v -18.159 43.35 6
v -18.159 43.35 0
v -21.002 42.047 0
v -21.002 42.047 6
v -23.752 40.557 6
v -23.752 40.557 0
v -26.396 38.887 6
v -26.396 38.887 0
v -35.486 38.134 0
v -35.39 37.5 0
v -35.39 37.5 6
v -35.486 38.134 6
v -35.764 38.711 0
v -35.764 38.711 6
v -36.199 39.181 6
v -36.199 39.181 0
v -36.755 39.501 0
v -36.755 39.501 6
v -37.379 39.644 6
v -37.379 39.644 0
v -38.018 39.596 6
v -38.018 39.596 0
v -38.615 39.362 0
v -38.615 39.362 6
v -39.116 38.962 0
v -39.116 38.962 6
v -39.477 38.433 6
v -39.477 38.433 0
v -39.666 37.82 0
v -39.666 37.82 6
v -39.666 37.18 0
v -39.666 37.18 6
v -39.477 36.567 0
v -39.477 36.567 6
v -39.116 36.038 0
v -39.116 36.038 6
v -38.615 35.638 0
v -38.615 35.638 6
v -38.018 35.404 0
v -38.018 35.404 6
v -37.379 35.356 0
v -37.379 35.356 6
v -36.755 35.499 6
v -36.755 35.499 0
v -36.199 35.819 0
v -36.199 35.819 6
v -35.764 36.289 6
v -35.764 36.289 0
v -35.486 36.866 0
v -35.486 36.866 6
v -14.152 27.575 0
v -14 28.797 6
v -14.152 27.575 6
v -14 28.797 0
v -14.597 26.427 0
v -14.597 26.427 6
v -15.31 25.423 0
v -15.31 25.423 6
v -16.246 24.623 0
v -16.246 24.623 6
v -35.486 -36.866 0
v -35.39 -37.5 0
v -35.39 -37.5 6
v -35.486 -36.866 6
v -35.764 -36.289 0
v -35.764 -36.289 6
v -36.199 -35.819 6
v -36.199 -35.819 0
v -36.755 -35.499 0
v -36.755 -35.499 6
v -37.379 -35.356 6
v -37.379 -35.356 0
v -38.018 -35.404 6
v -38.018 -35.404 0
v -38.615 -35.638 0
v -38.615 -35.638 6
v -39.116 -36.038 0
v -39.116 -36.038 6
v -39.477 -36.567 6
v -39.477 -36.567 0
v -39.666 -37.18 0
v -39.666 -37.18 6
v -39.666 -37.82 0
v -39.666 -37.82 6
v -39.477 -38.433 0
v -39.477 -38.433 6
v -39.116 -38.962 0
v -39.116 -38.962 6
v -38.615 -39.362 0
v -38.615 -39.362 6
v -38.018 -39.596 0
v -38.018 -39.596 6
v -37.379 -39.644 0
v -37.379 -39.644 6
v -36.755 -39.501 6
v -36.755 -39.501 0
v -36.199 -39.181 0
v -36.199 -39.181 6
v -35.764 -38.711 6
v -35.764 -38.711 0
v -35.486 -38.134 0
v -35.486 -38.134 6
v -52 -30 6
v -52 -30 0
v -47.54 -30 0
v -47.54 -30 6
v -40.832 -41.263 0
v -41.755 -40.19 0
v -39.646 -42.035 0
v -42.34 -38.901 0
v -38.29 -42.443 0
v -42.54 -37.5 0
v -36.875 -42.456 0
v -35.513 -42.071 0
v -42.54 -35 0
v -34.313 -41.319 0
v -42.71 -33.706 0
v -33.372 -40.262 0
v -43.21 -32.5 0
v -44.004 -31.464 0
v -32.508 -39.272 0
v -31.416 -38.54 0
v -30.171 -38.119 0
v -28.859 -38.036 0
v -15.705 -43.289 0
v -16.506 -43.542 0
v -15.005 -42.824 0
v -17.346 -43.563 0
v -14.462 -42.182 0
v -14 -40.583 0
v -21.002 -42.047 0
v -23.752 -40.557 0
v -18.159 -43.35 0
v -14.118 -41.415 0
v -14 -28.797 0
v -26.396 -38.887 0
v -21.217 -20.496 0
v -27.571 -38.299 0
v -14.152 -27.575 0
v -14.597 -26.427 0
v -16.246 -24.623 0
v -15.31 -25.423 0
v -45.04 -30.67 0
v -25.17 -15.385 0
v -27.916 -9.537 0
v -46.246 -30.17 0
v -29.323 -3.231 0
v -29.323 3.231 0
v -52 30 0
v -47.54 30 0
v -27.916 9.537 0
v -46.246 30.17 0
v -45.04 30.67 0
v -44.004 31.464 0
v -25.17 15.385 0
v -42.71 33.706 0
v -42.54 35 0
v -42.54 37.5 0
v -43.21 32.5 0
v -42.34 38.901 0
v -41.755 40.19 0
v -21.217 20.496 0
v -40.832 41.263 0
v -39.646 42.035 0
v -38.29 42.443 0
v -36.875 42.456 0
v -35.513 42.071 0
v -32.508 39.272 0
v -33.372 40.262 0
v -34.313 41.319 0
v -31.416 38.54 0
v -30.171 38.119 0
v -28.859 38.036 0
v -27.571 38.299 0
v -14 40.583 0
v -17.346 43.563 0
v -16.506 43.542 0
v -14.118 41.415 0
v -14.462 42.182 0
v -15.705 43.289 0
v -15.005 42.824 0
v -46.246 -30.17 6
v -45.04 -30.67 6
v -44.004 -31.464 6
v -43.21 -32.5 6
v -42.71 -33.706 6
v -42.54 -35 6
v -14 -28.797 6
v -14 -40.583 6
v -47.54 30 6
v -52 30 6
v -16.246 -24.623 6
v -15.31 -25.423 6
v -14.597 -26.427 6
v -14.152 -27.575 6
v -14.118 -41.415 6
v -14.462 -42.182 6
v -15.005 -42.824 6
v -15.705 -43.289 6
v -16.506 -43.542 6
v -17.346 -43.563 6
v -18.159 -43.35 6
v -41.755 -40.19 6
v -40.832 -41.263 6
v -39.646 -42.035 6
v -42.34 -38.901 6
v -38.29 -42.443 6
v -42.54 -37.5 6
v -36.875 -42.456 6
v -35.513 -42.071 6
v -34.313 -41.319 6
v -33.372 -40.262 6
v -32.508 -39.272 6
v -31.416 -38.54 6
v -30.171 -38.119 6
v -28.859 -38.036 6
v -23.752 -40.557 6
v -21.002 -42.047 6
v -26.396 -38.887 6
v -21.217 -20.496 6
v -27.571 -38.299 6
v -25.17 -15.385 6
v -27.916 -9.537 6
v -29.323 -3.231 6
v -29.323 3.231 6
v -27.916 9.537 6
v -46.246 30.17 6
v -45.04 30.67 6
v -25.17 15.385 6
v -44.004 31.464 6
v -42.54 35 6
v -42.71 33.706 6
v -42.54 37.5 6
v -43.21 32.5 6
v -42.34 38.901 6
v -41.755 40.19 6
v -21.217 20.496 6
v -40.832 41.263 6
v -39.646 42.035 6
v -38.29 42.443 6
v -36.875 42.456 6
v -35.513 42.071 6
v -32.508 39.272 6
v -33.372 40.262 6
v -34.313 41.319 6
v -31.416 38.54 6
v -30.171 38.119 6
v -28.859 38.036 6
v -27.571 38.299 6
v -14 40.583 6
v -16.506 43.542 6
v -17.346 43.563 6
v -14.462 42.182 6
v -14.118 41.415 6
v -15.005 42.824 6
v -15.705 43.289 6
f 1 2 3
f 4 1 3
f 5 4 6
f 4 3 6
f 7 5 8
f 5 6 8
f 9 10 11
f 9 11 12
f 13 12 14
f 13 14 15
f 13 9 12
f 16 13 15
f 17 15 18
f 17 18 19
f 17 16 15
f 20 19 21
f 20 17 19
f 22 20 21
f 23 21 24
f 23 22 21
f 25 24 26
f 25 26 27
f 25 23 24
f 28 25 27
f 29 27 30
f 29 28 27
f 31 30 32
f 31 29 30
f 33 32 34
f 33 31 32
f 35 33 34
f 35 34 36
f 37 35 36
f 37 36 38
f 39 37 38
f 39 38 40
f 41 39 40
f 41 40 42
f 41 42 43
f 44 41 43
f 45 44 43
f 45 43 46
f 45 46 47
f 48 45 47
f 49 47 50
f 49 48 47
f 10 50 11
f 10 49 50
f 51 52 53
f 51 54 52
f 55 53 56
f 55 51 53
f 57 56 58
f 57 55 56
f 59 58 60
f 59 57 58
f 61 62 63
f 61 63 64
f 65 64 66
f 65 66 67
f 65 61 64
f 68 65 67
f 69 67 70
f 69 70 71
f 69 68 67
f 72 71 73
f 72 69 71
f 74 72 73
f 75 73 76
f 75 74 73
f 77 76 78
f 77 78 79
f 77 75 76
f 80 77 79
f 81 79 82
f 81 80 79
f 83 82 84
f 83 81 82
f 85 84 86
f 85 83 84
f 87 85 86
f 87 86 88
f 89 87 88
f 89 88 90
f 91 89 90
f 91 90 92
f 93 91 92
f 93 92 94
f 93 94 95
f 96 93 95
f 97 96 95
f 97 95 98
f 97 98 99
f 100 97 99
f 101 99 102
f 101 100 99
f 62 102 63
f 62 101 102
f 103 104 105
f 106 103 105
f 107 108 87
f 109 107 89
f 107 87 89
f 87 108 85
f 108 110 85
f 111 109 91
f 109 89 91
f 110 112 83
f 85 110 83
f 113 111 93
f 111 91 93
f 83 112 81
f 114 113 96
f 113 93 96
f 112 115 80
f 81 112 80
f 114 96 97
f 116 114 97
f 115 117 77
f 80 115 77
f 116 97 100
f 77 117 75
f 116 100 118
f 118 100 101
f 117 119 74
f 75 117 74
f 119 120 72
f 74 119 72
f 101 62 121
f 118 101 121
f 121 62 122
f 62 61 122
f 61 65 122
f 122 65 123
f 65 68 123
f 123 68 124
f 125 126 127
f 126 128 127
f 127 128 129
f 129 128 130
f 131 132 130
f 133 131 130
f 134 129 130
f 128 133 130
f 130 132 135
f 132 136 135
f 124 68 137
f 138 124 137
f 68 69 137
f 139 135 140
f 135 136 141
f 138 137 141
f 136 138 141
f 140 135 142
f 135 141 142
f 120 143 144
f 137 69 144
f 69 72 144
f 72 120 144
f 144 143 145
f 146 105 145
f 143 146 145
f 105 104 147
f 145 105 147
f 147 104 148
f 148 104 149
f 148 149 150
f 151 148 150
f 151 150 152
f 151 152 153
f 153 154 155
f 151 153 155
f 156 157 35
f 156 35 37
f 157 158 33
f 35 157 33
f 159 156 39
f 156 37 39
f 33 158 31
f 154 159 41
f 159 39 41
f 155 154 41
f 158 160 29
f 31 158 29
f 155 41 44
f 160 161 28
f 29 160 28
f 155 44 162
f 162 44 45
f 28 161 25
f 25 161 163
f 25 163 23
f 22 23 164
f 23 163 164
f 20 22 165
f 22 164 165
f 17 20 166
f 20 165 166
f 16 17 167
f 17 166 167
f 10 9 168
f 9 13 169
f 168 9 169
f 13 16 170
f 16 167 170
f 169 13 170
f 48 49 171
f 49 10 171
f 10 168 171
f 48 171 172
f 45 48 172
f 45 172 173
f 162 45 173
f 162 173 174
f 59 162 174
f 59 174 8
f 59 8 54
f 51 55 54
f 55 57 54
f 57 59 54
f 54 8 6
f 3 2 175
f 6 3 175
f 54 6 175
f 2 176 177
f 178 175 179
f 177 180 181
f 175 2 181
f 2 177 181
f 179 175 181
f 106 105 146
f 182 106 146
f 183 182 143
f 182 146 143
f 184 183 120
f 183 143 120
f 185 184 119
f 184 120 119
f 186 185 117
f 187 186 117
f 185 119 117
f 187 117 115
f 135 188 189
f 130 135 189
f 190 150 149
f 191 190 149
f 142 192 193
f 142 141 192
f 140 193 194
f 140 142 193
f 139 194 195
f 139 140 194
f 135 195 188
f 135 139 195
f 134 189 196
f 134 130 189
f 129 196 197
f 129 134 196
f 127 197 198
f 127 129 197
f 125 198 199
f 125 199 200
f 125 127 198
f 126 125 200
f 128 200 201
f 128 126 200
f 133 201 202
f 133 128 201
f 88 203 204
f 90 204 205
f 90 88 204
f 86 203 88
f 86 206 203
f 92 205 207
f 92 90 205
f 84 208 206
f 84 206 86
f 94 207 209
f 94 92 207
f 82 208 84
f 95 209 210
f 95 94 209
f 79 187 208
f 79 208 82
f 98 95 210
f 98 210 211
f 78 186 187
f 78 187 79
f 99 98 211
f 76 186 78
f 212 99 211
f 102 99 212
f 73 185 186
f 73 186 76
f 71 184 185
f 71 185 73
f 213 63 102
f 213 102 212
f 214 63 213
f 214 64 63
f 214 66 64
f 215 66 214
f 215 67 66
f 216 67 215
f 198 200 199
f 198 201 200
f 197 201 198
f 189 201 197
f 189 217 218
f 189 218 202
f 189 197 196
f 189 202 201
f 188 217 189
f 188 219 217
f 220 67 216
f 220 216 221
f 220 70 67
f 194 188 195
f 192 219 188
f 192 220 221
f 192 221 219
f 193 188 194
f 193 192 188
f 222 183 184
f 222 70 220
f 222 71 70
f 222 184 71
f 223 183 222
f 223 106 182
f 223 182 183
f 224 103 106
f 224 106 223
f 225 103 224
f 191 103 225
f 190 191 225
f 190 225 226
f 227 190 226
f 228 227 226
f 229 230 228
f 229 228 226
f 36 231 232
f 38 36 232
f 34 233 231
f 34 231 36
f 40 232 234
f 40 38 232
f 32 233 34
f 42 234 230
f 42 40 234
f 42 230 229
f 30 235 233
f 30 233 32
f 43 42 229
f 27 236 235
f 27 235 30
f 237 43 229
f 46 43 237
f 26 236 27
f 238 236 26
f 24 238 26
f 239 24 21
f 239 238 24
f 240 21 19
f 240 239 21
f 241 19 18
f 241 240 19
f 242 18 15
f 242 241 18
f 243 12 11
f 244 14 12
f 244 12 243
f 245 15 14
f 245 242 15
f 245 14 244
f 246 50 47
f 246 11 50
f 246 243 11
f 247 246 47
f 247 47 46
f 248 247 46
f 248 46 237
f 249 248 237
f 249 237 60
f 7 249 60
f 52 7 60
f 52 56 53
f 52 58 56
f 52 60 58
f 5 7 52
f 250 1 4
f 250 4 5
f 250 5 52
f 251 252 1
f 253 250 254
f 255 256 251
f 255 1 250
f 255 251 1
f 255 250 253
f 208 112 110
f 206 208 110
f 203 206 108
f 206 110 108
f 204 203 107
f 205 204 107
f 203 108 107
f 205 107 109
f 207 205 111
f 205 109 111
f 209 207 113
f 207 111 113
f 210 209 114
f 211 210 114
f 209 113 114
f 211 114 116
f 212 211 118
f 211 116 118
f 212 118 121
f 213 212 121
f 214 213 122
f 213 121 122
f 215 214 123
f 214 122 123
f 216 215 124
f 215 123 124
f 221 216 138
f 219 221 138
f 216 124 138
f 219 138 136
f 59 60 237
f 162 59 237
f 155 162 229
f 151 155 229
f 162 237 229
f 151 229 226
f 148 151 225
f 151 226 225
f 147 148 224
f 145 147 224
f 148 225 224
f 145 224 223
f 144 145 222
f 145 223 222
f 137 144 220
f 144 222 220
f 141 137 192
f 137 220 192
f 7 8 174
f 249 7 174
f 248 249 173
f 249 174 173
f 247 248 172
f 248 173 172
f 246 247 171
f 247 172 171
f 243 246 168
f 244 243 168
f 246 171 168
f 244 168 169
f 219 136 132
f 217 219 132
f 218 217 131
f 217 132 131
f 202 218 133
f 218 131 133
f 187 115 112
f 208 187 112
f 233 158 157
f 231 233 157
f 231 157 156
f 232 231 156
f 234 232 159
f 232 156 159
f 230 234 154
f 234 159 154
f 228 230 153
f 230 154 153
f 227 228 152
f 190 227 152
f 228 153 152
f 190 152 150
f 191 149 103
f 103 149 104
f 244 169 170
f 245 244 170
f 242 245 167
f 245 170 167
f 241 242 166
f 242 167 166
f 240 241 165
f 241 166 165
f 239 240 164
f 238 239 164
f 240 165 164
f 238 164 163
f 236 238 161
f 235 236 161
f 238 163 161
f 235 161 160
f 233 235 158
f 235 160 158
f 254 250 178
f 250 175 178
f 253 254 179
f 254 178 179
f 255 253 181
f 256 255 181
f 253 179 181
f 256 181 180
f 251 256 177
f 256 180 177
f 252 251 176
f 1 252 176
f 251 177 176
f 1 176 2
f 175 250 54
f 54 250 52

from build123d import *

# Parameters (mm, degrees)
SKETCH_1_R          = 2.15
EXTRUDE_1_DEPTH     = 6
CUT_EXTRUDE_1_DEPTH = 10
FILLET_1_R          = 5
FILLET_2_R          = 3


with BuildPart() as part:
    # 草图1 → 凸台-拉伸1 (new body)
    with BuildSketch(Plane.XY):
        with BuildLine():
            Line((-52, 30), (-52, 8.75))
            Line((-52, 8.75), (-52, -8.75))
            Line((-52, -8.75), (-52, -30))
            Line((-52, -30), (-47.54, -30))
            ThreePointArc((-47.54, -30), (-44.004466094, -31.464466094), (-42.54, -35))
            Line((-42.54, -35), (-42.54, -37.5))
            ThreePointArc((-42.54, -37.5), (-38.982425028, -42.287422066), (-33.372235985, -40.262198963))
            ThreePointArc((-33.372235985, -40.262198963), (-30.171244586, -38.118753147), (-26.396349665, -38.887436588))
            ThreePointArc((-26.396349665, -38.887436588), (0, -47), (26.396349665, -38.887436588))
            ThreePointArc((26.396349665, -38.887436588), (30.171244586, -38.118753147), (33.372235985, -40.262198963))
            ThreePointArc((33.372235985, -40.262198963), (38.674773042, -42.369526686), (42.499484755, -38.135225128))
            Line((42.499484755, -38.135225128), (46.619156699, -5.971116201))
            ThreePointArc((46.619156699, -5.971116201), (47, 0), (46.619156699, 5.971116201))
            Line((46.619156699, 5.971116201), (42.499484755, 38.135225128))
            ThreePointArc((42.499484755, 38.135225128), (38.674773042, 42.369526686), (33.372235985, 40.262198963))
            ThreePointArc((33.372235985, 40.262198963), (30.171244586, 38.118753147), (26.396349665, 38.887436588))
            ThreePointArc((26.396349665, 38.887436588), (0, 47), (-26.396349665, 38.887436588))
            ThreePointArc((-26.396349665, 38.887436588), (-30.171244586, 38.118753147), (-33.372235985, 40.262198963))
            ThreePointArc((-33.372235985, 40.262198963), (-38.982425028, 42.287422066), (-42.54, 37.5))
            Line((-42.54, 37.5), (-42.54, 35))
            ThreePointArc((-42.54, 35), (-44.004466094, 31.464466094), (-47.54, 30))
            Line((-47.54, 30), (-52, 30))
        make_face()
        with Locations((-37.54, -37.5)):
            Circle(SKETCH_1_R, mode=Mode.SUBTRACT)
        with Locations((37.54, -37.5)):
            Circle(SKETCH_1_R, mode=Mode.SUBTRACT)
        with Locations((-37.54, 37.5)):
            Circle(SKETCH_1_R, mode=Mode.SUBTRACT)
        with Locations((37.54, 37.5)):
            Circle(SKETCH_1_R, mode=Mode.SUBTRACT)
    extrude(amount=EXTRUDE_1_DEPTH)

    # 草图2 → 切除-拉伸1 (cut)
    with BuildSketch(Plane.XY.offset(6)):
        with BuildLine():
            Line((-14, 44.866468548), (-14, 25.966324345))
            ThreePointArc((-14, 25.966324345), (-29.5, 0), (-14, -25.966324345))
            Line((-14, -25.966324345), (-14, -44.866468548))
            ThreePointArc((-14, -44.866468548), (6.881466199, -46.493498717), (26.396349665, -38.887436588))
            ThreePointArc((26.396349665, -38.887436588), (30.171244586, -38.118753147), (33.372235985, -40.262198963))
            ThreePointArc((33.372235985, -40.262198963), (38.674773042, -42.369526686), (42.499484755, -38.135225128))
            Line((42.499484755, -38.135225128), (46.619156699, -5.971116201))
            ThreePointArc((46.619156699, -5.971116201), (47, 0), (46.619156699, 5.971116201))
            Line((46.619156699, 5.971116201), (42.499484755, 38.135225128))
            ThreePointArc((42.499484755, 38.135225128), (38.674773042, 42.369526686), (33.372235985, 40.262198963))
            ThreePointArc((33.372235985, 40.262198963), (30.171244586, 38.118753147), (26.396349665, 38.887436588))
            ThreePointArc((26.396349665, 38.887436588), (6.881466199, 46.493498717), (-14, 44.866468548))
        make_face()
    extrude(amount=-CUT_EXTRUDE_1_DEPTH, mode=Mode.SUBTRACT)

    # 圆角1
    fillet_1_edges = [part.edges().sort_by_distance(p)[0] for p in [
        (-14, -25.966324345, 3),
        (-14, 25.966324345, 3),
    ]]
    fillet(fillet_1_edges, radius=FILLET_1_R)

    # 圆角2
    fillet_2_edges = [part.edges().sort_by_distance(p)[0] for p in [
        (-14, 44.866468548, 3),
        (-14, -44.866468548, 3),
    ]]
    fillet(fillet_2_edges, radius=FILLET_2_R)


solid = part.part
